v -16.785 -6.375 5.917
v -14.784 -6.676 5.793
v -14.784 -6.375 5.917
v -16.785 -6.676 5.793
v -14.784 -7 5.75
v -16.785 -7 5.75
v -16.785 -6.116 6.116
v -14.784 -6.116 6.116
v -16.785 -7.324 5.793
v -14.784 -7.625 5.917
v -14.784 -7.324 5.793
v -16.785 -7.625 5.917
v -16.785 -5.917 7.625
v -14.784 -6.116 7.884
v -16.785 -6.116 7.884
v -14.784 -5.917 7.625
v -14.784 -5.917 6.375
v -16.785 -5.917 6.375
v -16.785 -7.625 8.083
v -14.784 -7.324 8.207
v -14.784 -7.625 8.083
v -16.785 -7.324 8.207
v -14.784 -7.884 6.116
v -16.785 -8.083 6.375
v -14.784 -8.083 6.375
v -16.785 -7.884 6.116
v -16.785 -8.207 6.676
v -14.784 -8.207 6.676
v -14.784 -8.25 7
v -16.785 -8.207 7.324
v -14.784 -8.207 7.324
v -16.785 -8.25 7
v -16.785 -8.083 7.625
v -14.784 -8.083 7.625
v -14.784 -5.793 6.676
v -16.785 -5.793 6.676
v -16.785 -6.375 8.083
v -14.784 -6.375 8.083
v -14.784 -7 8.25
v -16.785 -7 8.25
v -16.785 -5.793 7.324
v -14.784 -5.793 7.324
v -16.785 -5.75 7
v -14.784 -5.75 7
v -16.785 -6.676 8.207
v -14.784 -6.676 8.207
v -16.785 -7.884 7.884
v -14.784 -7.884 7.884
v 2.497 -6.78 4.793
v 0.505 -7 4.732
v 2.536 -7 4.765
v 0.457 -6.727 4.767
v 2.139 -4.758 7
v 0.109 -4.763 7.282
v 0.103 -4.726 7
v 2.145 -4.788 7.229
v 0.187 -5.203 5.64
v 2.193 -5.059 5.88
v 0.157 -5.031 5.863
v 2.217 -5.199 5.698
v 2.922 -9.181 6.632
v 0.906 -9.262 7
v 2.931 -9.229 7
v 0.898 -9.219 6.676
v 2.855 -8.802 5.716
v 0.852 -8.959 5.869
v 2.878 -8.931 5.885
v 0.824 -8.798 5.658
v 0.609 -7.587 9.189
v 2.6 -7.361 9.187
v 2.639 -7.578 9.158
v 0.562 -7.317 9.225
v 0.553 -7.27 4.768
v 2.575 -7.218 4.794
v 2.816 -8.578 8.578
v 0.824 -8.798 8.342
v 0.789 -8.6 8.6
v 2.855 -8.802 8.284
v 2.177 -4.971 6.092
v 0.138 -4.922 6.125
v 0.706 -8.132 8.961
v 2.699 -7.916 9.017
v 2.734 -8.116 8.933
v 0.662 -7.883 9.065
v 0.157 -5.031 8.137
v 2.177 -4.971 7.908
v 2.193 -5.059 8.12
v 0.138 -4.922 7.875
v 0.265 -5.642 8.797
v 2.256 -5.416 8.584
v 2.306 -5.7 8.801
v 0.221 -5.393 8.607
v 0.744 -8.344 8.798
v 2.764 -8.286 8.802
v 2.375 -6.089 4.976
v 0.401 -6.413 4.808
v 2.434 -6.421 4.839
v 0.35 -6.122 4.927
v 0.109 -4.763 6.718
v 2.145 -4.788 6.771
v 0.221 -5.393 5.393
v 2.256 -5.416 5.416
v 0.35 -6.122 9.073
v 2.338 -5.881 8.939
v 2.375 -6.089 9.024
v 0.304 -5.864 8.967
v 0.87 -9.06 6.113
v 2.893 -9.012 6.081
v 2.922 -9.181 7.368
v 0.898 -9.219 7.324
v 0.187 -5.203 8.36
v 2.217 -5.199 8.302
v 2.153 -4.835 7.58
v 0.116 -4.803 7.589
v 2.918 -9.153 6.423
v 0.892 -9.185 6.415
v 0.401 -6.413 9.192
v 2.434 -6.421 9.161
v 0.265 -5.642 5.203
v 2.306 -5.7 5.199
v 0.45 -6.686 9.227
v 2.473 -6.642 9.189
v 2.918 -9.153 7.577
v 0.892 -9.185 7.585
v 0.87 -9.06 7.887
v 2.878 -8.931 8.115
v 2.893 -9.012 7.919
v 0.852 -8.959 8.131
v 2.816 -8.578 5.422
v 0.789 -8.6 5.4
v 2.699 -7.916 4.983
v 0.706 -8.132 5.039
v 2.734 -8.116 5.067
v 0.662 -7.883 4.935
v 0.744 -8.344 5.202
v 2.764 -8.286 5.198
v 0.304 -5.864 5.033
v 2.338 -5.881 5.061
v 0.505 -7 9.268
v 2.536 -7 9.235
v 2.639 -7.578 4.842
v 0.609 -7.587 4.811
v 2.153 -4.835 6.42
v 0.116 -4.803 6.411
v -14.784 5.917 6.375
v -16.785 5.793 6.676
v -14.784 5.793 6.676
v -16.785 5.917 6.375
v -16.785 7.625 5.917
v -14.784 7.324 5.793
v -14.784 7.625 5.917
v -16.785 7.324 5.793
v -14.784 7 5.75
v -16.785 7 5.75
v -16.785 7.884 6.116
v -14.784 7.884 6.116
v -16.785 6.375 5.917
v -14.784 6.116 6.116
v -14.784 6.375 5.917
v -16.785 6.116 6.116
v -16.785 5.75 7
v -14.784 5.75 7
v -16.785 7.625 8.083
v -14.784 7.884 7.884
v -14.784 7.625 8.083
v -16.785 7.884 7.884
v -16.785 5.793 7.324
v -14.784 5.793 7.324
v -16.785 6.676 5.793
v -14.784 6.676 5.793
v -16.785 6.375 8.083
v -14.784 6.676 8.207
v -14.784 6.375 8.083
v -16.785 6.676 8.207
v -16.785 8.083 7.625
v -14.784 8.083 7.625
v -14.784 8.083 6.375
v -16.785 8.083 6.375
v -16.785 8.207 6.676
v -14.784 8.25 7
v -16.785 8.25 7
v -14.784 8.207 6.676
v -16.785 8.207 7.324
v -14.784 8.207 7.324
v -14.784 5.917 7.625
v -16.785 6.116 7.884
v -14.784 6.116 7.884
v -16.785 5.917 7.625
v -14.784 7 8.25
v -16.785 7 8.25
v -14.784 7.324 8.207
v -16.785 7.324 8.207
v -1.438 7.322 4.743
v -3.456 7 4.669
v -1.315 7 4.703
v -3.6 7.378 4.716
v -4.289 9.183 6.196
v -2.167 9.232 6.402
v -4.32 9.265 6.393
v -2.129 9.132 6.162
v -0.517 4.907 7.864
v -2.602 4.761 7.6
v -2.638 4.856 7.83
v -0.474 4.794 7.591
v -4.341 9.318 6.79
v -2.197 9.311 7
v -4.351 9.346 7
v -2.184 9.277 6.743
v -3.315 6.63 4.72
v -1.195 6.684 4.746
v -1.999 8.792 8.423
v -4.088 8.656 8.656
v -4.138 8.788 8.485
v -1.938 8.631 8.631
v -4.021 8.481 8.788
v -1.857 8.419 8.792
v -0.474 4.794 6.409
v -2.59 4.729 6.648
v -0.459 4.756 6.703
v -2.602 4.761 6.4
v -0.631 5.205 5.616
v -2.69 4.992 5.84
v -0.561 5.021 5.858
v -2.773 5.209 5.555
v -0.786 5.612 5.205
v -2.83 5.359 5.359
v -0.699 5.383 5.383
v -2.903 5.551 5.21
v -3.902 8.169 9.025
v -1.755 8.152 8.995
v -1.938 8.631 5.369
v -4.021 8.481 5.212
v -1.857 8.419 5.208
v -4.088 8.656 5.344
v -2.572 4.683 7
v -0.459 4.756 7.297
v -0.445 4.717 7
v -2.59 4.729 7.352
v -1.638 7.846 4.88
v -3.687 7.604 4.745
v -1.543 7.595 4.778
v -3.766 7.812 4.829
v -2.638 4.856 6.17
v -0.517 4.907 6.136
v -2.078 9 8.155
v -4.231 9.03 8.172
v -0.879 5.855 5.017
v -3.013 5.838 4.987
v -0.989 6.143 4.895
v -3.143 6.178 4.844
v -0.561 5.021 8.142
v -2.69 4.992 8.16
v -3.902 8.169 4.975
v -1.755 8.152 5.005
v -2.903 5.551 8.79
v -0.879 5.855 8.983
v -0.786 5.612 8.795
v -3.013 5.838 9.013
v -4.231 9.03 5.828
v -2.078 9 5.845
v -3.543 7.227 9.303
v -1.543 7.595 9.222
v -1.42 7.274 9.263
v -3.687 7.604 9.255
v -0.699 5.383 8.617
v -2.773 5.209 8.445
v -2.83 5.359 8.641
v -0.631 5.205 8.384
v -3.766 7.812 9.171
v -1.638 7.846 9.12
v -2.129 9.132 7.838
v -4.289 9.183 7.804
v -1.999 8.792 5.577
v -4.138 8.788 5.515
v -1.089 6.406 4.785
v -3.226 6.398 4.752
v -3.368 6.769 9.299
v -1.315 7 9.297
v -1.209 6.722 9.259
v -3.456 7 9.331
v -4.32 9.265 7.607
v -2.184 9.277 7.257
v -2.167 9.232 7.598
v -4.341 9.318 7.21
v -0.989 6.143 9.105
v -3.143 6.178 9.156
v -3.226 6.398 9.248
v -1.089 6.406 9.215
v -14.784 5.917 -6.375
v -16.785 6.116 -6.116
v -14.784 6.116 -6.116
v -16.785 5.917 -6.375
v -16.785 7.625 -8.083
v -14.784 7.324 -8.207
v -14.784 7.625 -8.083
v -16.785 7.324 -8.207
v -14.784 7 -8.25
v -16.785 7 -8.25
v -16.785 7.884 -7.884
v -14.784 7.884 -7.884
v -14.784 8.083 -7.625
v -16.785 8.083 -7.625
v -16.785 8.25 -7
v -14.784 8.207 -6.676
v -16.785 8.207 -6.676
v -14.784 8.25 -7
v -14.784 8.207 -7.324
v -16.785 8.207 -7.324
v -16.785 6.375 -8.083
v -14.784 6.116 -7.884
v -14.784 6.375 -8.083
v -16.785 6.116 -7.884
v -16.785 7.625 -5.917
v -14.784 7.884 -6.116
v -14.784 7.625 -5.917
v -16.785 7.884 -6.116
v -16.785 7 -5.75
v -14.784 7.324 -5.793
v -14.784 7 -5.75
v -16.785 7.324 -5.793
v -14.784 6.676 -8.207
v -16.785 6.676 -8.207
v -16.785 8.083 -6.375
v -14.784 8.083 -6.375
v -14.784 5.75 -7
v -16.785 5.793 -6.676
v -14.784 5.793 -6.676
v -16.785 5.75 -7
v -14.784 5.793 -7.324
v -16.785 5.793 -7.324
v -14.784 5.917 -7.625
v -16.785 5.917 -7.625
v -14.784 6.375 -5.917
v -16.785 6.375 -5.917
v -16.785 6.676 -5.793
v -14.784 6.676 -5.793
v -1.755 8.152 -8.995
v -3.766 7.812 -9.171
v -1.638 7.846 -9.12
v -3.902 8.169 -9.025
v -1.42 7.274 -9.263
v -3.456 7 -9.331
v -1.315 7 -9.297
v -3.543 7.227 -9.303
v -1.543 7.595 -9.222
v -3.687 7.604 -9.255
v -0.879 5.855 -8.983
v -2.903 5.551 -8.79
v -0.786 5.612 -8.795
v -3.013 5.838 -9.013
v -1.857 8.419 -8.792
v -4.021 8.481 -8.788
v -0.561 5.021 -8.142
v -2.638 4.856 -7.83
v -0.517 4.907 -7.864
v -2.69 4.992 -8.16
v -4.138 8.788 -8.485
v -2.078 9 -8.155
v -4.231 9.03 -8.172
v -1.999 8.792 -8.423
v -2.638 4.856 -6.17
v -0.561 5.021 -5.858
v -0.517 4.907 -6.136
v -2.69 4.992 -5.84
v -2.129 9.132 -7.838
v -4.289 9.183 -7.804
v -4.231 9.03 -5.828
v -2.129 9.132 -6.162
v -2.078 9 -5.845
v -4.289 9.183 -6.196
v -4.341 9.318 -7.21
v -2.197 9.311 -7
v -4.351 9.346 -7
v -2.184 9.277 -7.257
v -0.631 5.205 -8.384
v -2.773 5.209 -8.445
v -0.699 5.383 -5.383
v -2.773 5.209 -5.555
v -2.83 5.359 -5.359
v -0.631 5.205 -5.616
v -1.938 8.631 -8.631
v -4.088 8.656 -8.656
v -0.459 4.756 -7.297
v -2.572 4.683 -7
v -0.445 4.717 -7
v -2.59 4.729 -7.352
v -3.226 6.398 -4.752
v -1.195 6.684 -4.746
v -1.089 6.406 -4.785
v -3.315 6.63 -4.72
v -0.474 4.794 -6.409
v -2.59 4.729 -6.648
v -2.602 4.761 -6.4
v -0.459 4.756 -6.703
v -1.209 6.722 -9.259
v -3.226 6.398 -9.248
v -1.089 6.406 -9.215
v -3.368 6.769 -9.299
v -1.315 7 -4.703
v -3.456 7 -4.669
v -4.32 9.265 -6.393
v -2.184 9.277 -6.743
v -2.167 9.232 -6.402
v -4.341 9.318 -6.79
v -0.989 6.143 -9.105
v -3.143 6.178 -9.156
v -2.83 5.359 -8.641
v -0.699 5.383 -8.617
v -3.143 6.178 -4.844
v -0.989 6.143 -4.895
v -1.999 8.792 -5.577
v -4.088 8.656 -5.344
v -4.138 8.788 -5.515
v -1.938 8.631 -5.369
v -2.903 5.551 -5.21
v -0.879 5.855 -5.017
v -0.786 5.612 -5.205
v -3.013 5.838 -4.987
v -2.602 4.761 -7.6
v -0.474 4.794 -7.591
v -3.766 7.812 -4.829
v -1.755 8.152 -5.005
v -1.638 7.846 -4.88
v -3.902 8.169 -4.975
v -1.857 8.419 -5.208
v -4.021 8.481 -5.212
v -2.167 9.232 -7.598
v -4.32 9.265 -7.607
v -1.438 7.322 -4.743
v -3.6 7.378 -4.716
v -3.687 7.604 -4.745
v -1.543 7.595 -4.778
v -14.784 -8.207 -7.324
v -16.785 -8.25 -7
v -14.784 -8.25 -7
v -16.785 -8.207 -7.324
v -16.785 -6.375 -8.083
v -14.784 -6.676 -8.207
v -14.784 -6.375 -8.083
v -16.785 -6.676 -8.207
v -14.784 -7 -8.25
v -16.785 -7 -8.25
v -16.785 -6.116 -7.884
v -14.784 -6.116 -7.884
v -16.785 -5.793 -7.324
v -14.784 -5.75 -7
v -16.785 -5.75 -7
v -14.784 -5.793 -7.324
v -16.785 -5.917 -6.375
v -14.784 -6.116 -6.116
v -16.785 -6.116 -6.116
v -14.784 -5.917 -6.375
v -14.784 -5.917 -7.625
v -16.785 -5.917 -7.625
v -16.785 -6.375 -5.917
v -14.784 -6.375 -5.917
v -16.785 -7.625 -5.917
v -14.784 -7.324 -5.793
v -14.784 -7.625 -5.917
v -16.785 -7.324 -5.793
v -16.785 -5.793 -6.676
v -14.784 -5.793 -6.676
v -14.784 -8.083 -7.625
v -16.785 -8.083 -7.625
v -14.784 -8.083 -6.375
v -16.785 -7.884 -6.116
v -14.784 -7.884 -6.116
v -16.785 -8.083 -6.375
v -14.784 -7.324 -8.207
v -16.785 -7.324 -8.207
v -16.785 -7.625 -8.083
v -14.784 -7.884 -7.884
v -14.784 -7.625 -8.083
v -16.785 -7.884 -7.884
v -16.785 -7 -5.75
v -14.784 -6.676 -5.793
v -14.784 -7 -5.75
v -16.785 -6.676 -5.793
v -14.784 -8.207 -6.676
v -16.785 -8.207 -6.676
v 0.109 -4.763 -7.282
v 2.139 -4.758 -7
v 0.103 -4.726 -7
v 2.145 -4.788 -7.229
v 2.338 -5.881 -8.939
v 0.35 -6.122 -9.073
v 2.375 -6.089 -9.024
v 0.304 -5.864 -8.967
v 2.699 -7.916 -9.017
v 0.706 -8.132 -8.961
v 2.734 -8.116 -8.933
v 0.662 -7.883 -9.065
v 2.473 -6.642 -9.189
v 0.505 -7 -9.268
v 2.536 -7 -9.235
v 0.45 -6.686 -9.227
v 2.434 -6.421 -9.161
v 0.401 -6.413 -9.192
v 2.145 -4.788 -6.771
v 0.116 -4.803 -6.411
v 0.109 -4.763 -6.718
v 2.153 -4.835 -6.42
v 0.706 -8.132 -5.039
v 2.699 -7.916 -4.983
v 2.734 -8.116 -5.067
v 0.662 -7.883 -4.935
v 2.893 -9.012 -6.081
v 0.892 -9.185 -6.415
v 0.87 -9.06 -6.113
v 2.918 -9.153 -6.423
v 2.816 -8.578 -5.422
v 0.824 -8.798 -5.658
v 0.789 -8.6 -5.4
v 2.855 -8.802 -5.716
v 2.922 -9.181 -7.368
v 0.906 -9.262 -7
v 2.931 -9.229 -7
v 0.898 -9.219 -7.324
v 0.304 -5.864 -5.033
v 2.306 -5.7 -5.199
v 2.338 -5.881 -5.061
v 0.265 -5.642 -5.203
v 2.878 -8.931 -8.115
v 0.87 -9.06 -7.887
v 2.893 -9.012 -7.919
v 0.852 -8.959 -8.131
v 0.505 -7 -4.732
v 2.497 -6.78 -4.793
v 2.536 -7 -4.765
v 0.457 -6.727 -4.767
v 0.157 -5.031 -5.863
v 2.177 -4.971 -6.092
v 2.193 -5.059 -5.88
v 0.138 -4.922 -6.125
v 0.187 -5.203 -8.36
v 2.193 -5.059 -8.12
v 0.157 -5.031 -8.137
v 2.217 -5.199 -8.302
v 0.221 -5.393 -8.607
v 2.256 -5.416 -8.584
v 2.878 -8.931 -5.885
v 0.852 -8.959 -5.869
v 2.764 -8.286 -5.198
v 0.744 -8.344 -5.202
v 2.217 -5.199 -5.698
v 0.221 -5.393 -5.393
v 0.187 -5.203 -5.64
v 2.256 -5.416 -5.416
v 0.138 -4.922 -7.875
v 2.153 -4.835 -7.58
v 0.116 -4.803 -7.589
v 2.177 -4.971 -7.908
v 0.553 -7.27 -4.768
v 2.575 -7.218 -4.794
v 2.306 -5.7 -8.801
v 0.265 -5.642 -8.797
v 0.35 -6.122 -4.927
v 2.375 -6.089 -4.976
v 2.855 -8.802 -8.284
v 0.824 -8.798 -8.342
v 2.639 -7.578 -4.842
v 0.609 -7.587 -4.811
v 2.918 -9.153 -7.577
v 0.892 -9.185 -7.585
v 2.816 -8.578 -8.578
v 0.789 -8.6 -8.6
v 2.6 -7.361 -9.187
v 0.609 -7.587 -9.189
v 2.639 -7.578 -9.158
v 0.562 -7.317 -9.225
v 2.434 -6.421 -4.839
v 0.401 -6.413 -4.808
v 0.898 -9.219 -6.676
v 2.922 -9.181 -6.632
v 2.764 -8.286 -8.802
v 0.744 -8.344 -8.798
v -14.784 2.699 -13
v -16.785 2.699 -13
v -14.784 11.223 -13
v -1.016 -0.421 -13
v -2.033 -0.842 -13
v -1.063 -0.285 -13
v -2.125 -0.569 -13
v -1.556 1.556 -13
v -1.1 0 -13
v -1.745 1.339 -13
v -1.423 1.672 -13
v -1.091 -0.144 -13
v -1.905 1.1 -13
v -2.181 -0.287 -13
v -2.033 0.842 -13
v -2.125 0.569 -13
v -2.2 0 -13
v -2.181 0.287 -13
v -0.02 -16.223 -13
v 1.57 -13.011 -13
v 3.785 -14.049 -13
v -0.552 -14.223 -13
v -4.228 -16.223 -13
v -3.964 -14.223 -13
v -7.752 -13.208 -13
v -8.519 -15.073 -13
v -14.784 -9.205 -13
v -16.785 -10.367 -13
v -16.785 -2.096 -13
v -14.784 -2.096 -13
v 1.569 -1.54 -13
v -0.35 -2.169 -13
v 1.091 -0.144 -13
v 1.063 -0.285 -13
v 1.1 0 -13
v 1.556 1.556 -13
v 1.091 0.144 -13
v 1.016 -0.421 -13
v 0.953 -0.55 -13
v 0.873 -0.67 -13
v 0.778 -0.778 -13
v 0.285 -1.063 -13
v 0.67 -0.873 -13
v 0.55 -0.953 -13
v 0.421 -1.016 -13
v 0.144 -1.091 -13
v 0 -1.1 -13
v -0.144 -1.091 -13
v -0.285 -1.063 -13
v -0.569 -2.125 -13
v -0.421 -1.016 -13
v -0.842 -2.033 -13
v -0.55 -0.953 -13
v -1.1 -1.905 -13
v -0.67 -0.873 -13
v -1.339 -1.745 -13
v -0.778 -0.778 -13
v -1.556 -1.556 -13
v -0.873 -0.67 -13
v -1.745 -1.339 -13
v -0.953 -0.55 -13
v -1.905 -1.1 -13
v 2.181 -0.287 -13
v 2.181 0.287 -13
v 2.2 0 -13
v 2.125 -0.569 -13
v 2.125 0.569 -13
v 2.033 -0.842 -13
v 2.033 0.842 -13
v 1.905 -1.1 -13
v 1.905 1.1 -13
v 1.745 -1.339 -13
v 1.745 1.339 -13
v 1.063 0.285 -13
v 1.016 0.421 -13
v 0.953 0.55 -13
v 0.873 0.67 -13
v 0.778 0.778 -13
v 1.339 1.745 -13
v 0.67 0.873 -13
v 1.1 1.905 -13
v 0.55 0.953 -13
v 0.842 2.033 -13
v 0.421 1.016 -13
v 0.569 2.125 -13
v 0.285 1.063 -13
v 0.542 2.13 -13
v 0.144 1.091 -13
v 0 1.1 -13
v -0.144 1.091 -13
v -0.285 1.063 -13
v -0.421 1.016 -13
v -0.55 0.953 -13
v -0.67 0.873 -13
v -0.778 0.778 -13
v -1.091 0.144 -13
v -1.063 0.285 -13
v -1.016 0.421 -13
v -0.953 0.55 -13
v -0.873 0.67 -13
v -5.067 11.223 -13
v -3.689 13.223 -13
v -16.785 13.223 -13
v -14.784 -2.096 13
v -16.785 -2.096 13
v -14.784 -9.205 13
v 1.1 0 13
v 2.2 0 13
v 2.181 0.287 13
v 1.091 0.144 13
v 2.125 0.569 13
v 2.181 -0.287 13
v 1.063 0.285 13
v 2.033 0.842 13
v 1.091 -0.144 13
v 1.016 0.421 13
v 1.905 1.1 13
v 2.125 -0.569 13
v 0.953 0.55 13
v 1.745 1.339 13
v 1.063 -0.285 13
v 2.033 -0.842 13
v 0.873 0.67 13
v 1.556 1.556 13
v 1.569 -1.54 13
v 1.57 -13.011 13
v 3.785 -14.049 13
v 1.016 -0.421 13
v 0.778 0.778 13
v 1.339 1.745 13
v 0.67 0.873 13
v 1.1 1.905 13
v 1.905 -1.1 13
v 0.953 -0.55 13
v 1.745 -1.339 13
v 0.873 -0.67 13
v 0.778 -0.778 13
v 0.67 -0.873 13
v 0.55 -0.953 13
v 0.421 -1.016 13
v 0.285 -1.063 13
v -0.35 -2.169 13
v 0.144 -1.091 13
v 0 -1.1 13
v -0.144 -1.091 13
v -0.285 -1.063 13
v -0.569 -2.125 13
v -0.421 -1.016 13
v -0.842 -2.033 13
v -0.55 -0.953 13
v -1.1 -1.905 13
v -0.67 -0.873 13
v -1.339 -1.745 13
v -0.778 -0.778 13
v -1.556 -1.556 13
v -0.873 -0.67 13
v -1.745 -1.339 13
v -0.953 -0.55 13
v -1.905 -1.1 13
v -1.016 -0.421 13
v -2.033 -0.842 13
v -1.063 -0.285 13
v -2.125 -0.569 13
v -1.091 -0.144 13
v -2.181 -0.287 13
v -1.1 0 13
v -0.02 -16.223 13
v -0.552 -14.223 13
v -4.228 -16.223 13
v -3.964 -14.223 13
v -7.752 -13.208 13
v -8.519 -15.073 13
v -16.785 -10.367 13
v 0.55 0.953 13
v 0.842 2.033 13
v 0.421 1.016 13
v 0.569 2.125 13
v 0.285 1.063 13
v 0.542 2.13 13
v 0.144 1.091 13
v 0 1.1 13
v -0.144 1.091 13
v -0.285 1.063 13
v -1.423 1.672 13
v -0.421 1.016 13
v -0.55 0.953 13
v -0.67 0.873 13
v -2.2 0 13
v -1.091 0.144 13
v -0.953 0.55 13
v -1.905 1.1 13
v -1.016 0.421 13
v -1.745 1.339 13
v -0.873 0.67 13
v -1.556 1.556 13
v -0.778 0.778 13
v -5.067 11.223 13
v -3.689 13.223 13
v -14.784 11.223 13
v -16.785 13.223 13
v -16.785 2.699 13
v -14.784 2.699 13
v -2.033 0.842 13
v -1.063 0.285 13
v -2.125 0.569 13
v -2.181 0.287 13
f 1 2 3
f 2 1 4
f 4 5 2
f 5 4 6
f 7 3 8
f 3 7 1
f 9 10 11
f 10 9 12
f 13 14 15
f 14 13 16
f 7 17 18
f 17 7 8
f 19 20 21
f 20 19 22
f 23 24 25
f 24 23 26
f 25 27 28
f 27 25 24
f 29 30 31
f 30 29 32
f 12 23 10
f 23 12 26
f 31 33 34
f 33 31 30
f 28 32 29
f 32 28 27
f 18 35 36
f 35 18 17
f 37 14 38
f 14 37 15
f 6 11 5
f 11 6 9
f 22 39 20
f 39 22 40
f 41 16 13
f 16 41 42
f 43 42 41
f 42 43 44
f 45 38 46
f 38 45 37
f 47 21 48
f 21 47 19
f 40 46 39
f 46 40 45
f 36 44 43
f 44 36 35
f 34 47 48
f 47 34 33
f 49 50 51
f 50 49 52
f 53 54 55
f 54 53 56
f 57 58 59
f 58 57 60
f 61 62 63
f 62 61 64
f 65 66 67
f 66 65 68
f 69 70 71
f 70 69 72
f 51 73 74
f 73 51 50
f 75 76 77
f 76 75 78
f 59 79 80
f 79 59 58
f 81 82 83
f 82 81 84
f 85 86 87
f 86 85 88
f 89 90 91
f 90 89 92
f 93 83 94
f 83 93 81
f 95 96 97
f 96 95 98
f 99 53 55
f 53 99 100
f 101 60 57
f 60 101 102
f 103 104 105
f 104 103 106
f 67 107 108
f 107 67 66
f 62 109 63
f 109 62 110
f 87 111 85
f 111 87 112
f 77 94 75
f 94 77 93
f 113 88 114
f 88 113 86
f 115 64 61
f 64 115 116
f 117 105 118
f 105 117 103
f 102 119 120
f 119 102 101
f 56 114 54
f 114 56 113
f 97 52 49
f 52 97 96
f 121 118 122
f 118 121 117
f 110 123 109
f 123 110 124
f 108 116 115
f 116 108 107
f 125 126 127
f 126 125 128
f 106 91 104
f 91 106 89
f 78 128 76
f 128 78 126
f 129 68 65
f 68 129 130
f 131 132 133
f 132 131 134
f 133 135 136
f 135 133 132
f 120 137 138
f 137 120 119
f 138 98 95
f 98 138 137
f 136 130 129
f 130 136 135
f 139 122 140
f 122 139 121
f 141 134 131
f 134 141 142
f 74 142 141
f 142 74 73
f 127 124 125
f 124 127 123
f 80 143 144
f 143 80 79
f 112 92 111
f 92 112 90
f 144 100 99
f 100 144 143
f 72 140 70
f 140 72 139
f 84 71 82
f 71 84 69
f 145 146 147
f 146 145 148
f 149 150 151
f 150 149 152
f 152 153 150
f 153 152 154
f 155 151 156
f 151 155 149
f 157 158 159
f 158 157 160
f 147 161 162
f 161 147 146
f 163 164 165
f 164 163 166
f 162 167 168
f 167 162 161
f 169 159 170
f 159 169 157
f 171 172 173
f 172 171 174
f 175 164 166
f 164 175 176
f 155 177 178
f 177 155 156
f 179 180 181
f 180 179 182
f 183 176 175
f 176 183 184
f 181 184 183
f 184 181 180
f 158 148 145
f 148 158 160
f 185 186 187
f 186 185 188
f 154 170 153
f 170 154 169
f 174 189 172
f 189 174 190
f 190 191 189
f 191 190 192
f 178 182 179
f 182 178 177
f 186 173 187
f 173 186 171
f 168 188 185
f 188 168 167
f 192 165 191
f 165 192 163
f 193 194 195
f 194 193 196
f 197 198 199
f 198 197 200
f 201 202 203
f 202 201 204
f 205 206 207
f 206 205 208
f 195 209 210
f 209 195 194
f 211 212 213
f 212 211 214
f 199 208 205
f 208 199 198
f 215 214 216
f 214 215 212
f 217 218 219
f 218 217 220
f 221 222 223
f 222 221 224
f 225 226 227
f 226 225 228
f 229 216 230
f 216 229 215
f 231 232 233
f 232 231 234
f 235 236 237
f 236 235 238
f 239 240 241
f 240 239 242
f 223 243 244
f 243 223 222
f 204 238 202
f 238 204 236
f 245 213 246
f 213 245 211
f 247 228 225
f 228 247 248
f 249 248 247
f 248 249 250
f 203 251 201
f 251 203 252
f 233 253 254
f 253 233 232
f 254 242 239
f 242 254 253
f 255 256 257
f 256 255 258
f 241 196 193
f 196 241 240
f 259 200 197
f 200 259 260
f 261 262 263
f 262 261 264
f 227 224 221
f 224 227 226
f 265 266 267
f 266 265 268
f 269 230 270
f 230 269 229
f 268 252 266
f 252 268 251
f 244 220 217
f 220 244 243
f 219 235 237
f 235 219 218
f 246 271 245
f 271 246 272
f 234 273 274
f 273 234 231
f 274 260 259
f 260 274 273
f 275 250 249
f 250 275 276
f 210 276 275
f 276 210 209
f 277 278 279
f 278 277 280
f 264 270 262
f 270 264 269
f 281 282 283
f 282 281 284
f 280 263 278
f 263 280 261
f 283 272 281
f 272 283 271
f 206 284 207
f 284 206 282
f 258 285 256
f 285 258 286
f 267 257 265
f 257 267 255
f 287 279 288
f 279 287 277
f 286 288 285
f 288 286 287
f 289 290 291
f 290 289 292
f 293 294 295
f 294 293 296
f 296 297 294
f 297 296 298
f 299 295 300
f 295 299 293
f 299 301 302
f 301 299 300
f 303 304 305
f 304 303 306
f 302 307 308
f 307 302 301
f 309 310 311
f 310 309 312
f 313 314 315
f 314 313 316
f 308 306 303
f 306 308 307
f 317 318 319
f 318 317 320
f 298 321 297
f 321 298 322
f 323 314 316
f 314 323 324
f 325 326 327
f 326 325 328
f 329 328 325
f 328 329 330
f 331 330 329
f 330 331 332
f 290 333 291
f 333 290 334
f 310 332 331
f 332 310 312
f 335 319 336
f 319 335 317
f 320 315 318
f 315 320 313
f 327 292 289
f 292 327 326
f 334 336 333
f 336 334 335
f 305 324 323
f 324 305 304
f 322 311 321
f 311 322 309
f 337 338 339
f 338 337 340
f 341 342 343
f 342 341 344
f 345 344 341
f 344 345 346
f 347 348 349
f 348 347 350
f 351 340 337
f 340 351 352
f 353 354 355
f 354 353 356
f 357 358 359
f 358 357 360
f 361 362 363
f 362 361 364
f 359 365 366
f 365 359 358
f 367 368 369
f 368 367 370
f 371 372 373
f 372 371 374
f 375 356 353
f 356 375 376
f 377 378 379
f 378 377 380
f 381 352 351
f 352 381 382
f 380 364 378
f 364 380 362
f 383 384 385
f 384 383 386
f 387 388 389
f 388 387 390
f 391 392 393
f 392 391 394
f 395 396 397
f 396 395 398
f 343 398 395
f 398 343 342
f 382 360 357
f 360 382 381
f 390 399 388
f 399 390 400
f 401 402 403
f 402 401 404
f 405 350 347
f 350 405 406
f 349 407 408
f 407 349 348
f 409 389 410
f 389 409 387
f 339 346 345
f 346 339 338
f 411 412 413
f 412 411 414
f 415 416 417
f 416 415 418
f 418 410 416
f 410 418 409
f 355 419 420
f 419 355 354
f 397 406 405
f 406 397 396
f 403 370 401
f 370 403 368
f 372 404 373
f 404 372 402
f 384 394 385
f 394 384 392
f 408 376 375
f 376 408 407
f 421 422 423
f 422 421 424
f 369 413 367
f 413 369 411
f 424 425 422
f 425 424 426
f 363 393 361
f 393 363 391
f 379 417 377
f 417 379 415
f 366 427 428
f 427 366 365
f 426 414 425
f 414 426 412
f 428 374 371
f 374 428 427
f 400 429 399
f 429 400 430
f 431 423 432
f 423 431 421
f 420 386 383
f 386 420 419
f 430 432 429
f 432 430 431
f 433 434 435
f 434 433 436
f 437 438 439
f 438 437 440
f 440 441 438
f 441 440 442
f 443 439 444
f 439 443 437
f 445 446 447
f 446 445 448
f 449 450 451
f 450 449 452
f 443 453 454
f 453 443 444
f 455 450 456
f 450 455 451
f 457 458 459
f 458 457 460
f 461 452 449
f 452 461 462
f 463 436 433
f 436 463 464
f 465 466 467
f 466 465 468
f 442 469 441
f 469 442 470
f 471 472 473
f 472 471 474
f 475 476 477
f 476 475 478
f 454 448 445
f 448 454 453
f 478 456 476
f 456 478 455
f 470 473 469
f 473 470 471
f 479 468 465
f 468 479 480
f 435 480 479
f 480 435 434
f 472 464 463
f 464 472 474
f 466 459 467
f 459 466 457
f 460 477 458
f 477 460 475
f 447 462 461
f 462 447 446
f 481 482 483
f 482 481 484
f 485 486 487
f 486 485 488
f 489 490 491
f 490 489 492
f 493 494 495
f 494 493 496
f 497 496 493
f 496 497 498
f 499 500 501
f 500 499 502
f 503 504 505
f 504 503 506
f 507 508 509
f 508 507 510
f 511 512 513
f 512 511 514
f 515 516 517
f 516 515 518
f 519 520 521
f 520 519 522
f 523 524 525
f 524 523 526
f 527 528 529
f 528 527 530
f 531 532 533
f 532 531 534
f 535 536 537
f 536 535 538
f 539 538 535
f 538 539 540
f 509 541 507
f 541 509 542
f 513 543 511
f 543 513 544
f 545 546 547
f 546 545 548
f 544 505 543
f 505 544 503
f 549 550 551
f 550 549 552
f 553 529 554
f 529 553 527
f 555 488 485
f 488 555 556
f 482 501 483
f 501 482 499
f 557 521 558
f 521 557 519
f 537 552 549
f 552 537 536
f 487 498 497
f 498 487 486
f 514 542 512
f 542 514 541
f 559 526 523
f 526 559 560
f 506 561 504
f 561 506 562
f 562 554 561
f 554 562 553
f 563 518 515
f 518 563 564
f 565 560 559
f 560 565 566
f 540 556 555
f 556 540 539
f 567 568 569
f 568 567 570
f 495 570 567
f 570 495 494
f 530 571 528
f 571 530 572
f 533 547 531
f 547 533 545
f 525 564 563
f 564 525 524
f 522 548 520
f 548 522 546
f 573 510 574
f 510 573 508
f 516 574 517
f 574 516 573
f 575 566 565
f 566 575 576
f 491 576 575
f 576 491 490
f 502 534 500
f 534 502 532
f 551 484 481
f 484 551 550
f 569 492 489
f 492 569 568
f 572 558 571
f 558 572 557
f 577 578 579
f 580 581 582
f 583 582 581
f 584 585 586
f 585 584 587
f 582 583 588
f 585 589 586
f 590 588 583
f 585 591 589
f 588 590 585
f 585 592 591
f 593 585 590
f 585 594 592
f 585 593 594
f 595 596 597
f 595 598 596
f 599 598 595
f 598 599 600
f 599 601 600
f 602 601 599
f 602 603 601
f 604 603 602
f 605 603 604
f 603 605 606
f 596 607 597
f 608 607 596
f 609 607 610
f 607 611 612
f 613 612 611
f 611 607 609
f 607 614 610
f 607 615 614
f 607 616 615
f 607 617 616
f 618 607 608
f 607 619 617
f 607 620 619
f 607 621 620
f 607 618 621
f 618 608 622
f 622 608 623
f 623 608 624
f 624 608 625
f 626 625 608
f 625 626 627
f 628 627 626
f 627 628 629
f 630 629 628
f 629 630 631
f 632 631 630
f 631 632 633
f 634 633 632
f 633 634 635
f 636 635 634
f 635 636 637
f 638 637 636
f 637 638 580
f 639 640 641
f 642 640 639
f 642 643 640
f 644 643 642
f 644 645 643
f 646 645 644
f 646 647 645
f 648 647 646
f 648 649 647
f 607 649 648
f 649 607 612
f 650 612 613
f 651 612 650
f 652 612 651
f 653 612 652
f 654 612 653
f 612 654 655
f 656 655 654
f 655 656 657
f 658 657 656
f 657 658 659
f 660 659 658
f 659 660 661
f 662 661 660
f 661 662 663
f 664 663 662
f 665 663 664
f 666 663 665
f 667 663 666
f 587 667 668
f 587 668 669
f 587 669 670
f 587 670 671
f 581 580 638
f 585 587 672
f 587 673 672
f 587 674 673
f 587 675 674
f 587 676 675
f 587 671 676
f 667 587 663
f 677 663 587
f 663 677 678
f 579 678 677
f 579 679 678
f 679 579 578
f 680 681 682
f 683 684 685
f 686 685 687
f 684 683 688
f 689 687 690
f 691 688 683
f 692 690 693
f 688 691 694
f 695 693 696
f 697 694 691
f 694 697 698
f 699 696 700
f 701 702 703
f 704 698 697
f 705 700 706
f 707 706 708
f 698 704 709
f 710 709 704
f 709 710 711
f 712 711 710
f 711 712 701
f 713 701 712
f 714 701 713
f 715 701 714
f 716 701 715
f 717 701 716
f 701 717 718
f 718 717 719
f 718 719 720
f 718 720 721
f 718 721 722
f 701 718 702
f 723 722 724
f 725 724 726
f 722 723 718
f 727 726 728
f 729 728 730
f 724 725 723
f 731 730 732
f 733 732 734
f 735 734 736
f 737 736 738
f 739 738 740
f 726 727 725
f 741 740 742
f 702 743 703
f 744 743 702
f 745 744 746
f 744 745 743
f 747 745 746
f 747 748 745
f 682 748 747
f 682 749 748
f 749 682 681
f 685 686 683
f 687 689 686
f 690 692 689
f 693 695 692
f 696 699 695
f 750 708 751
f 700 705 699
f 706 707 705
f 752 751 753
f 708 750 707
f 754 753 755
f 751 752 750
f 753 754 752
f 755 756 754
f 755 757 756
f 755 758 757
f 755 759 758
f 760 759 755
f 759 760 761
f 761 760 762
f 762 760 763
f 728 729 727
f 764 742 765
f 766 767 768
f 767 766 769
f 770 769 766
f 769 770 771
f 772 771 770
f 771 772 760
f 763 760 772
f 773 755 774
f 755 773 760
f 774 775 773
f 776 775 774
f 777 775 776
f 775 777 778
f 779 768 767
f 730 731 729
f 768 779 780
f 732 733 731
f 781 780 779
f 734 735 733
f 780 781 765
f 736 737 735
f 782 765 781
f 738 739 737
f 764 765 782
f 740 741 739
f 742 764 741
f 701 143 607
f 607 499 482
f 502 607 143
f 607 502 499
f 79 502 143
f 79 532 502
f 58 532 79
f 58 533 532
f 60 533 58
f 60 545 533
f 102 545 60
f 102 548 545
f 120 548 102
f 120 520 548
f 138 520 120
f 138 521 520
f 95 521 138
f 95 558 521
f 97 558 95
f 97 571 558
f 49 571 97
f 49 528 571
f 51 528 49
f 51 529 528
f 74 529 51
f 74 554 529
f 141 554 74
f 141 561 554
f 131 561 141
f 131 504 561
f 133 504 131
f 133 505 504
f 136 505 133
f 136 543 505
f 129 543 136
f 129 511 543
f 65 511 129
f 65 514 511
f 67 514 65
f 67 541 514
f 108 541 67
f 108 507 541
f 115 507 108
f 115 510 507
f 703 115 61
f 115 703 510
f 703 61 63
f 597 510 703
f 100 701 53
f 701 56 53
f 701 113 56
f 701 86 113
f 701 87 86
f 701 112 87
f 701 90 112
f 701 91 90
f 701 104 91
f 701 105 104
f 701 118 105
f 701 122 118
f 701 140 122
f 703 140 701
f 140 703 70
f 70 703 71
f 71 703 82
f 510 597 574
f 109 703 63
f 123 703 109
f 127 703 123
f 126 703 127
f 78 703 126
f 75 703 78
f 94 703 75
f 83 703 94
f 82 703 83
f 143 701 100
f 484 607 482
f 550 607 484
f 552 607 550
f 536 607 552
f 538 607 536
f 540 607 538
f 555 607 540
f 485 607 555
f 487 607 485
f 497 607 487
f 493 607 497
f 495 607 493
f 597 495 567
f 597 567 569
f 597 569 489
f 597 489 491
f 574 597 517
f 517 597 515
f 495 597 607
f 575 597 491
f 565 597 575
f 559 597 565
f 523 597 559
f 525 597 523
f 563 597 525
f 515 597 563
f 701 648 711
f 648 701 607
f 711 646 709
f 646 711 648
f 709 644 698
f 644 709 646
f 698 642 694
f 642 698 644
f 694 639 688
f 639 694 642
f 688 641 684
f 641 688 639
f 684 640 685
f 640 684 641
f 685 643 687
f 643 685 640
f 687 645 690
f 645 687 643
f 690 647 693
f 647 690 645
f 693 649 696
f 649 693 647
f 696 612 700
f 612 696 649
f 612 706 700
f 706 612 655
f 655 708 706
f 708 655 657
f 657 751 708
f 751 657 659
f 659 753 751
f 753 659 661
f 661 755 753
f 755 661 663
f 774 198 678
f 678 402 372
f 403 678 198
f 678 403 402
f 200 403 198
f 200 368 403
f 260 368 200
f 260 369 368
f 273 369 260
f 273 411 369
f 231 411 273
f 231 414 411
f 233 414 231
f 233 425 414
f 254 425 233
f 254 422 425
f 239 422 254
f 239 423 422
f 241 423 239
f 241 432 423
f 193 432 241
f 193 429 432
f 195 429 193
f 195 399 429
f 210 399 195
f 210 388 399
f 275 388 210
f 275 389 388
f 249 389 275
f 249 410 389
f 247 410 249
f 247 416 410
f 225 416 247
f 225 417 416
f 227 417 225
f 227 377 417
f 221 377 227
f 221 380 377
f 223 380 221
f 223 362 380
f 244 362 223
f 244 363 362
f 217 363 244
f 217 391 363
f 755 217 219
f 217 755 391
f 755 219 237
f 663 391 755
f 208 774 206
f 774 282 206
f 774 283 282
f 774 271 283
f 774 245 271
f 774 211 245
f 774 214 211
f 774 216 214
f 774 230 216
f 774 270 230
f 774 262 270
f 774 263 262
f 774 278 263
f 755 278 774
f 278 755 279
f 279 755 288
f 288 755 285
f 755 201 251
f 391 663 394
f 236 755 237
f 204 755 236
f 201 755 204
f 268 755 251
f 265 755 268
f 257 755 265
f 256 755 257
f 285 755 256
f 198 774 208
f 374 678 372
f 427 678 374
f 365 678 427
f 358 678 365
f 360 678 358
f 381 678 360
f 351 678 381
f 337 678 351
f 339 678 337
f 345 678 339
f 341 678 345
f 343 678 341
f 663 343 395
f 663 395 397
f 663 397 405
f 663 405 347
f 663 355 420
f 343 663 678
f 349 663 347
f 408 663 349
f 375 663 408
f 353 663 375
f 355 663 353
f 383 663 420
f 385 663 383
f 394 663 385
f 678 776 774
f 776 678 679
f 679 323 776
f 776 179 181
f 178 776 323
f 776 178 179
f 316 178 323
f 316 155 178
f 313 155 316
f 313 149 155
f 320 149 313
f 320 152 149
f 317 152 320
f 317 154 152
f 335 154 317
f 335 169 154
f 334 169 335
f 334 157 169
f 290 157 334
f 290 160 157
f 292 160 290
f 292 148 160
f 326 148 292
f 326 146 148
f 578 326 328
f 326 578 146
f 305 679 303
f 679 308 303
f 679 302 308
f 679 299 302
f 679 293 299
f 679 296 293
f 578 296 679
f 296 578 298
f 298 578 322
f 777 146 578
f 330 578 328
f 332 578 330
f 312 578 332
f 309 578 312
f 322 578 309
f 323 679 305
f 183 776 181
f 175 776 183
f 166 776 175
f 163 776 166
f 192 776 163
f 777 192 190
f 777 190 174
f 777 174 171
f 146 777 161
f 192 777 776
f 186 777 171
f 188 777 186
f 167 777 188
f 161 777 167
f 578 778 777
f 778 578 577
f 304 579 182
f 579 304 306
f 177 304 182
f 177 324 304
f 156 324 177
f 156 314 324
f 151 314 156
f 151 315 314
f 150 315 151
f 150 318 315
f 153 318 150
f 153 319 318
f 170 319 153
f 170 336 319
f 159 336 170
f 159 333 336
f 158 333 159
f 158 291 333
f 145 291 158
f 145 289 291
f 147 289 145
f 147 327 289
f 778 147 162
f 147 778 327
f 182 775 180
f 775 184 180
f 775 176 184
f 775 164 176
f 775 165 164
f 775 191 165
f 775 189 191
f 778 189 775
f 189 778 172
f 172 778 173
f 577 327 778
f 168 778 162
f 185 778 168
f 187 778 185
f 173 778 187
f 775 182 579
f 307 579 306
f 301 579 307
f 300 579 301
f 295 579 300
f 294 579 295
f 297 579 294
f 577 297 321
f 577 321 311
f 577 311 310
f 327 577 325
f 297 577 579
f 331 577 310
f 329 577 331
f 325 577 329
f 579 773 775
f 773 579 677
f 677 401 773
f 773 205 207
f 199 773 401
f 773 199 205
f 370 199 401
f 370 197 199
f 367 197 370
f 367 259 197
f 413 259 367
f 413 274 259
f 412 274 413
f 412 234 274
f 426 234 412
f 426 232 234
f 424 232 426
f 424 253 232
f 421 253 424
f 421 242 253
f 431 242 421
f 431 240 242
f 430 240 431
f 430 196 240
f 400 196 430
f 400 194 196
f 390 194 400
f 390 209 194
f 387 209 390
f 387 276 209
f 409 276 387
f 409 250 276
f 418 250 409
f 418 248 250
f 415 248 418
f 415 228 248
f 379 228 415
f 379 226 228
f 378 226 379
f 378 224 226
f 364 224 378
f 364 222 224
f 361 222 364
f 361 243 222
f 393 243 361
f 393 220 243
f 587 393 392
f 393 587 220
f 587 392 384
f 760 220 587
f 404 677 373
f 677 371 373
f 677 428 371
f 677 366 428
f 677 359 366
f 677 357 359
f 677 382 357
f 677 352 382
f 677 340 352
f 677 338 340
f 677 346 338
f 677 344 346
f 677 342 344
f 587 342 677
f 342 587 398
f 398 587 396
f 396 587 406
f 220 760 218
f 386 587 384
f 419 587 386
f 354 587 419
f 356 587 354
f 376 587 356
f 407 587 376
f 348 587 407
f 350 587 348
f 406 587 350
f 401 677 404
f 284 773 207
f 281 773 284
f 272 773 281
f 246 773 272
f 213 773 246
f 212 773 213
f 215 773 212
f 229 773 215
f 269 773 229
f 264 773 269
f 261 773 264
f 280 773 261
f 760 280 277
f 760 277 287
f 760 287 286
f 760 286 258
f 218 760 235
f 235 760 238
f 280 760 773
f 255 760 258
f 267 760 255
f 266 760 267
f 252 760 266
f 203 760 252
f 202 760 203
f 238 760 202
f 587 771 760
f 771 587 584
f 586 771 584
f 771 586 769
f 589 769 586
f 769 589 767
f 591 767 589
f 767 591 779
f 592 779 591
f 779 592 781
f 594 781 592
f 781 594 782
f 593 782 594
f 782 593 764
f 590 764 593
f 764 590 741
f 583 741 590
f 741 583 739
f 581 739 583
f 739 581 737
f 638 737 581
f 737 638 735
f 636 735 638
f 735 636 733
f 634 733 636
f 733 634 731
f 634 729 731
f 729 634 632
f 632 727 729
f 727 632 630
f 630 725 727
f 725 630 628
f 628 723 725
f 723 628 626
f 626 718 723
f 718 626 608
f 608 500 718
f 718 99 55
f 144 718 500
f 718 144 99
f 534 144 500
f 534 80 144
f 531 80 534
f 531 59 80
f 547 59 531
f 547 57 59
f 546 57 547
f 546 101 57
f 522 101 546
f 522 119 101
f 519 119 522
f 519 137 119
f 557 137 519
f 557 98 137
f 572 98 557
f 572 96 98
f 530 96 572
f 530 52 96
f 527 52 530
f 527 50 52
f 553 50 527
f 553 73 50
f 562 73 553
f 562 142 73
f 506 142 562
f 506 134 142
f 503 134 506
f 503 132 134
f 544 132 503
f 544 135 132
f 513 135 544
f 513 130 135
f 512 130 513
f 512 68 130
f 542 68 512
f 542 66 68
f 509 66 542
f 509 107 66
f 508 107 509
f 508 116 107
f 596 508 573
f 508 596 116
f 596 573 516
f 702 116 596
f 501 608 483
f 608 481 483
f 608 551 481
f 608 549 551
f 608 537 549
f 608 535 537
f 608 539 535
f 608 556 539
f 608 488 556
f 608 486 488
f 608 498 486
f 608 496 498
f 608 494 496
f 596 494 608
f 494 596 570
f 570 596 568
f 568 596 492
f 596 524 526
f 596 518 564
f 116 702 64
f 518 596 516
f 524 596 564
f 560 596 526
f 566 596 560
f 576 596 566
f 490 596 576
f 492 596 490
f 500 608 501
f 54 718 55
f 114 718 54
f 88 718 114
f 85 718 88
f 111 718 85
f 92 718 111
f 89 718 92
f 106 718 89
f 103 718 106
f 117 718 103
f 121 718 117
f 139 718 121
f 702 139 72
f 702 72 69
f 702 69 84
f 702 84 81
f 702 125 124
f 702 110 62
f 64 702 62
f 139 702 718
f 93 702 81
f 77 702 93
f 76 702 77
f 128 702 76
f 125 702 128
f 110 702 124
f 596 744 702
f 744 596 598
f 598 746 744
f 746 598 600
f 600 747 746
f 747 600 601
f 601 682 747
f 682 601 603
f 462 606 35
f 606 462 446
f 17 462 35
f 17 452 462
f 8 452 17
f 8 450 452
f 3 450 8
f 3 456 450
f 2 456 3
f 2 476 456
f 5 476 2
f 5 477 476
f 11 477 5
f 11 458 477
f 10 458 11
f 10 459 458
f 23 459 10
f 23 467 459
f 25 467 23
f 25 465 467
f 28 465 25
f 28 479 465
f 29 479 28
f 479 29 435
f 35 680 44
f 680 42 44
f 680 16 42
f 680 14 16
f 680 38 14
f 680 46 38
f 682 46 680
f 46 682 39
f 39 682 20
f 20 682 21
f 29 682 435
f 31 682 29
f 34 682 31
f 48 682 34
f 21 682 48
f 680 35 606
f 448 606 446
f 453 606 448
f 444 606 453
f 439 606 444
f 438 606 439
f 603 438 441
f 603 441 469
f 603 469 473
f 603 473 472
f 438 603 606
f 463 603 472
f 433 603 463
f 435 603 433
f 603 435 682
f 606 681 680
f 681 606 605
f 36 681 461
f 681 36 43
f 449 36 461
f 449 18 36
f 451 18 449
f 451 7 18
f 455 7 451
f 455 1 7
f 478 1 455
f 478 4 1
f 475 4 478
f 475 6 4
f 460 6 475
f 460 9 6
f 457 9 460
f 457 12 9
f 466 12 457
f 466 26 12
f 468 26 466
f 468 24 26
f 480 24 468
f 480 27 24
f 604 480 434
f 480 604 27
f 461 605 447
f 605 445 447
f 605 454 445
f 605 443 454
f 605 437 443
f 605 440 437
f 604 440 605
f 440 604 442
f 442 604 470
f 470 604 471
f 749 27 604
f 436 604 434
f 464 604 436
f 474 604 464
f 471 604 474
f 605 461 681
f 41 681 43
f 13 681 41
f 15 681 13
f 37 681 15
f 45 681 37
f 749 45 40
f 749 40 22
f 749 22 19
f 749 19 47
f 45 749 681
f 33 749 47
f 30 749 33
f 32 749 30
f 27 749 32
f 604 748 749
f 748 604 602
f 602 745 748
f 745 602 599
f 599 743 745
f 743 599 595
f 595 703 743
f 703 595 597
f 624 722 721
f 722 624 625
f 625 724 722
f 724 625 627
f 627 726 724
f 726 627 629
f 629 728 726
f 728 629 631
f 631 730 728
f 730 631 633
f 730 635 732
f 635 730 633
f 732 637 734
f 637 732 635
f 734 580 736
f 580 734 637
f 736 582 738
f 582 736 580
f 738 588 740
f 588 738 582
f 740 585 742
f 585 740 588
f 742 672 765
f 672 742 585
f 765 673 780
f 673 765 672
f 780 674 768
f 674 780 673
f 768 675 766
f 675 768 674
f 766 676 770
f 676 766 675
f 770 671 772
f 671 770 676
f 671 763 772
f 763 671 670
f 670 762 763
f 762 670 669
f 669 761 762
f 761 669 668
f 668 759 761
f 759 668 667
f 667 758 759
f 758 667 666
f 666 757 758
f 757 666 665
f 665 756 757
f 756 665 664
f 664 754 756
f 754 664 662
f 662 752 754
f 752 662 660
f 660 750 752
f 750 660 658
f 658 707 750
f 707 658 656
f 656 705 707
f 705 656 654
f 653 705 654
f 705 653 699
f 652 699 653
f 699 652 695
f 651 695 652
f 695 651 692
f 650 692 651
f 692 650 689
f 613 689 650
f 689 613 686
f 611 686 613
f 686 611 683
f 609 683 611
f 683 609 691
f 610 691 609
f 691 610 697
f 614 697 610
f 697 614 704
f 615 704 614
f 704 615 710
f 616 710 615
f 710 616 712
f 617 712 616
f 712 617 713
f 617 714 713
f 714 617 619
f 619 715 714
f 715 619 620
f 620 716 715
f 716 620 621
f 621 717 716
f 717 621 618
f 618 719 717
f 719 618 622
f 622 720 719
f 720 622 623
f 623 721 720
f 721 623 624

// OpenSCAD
// file: laser_box.scad
/*
 * laser_box.scad <https://github.com/bobm123/maker>
 *
 * Copyright (c) 2016 Robert Marchese.
 * Licensed under the MIT license.
 *
 * OpenSCAD modules to generate parts for a laser cut
 * box given the outside dimentsion, number of fingers
 * for the box joints and thickness of the material
 *
 */

KERF = .3;
SPACER = 2+KERF;


// Example of 50mm x 30mm x 1", made from 1/16" thick matertial
//laser_box(50, 30, 25.4*1, 11, 25.4*(1/16));
LENGTH = 25.4 * 8;
WIDTH = 25.4 * 7;
HEIGHT = 25.4 * 8;
laser_box(LENGTH, WIDTH, HEIGHT, 25, 4);


module laser_box(length, width, height, fingers, material)
{
    finger_width = height / fingers;
    translate([0, 0, 0])
        bottom(length, width, fingers, KERF, material);

    translate([length+SPACER, 0, 0]) 
        side1(width, height, fingers, KERF, material);
    translate([length+SPACER+width+SPACER, 0, 0])
        side2(length, height, fingers, KERF, material);

}


module box_joint(jlen, fcount, thick, kerf, show_a)
{
    flen = jlen / fcount;
    rotate([0, 0, 90])
    if (show_a) {
        side_a(jlen, flen, thick, kerf, (1+fcount)%2);
    }
    else {
        side_b(jlen, flen, thick, kerf, fcount%2);
    }
}


module side_a(jlen, flen, thick, kerf, even=1)
{
    os_initial = 0;
    intersection() {
        square([jlen+kerf, thick]);
        for (n = [0:1:(jlen)/(2*flen)-even]) {
            os = os_initial + n*2*flen;
            translate([os, 0]) 
                square([flen+kerf, thick]);
        }
    }
}


module side_b(jlen, flen, thick, kerf, odd=1)
{
    os_initial = flen;
    intersection() {
        square([jlen+kerf, thick]);
        for (n = [0:1:(jlen)/(2*flen)-odd]) {
            os = os_initial + n*2*flen;
            translate([os, 0]) 
                square([flen+kerf, thick]);
        }
    }
}


module bottom(length, width, fingers, kerf, material) {
    // flat bottom for now
    square([length+kerf, width+kerf]);
}


module side1(width, height, fingers, kerf, material) {
    translate([material, 0])
        square([width-(2*material-kerf), height+kerf]);
    translate([material, 0,])
        box_joint(height, fingers, material, kerf, true);
    translate([width+kerf, 0])
        box_joint(height, fingers, material, kerf, true);
}


module side2(length, height, fingers, kerf, material) {
    translate([material, 0])
        square([length-(2*material-kerf), height+kerf]);
    translate([material, 0,])
        box_joint(height, fingers, material, kerf, false);
    translate([length+kerf, 0])
        box_joint(height, fingers, material, kerf, false);
}
// file: LaserTilt.scad
/*!
 * LaserTile.scad <https://github.com/bobm123/maker>
 *
 * Copyright (c) 2016 Robert Marchese.
 * Licensed under the MIT license.
 *
 * OpenSCAD modules to generate a tilt mount for small
 * outrunner motors.
 *
 */
use <laser_box.scad>;

KERF = .3;
SPACER = 4+KERF;

thickness = 25.4*(1/16);
tilt_mount(27, 30, 26, 5, thickness);

module tilt_mount(length, width, height, fingers, material)
{
    //side plate
    difference() {
        translate([0, 0, 0]) {
            side1(length, height, fingers, KERF, material);
        }
    polygon([[0,height-4],
             [0,height+KERF],
             [length/2, height+KERF]]);
    polygon([[0,4],[0,0],[length-material, 0]]);
        translate([2+length/4, height/2, 0])
            circle(r=25.4*(1/32), center=true, $fn=48);
        translate([2+length/2, height-3, 0])
            circle(r=25.4*(1/64), center=true, $fn=48);  
    }
    
    // back plate
    translate([-(width+SPACER), height/fingers, 0])    
        side1(width, (height/fingers)*(fingers-2), fingers-2, KERF, material);

    // front plate
    translate([length+SPACER, 0, 0]) {
        difference() {
            side2(width, height, fingers, KERF, material);
            translate([width/2, 1.5, 0])
                square([6,3], center=true);
            translate([width/2, height/2, 0]) {
                circle(r=3.5, center=true, $fn=48);
                for (a=[45:90:360]) rotate([0, 0, a]) {
                    translate([7, 0])
                        circle(r=1.1, center=true, $fn=48);
                    translate([14, 0])
                        circle(r=1.25, center=true, $fn=48);
                }
            }
        }
    }
}

module side_plate(length, width, height, fingers, material)
{
    difference() {
        translate([0, 0, 0]) {
            side1(length, height, fingers, KERF, material);
        }
    polygon([[0,height-4],
             [0,height+KERF],
             [length/2, height+KERF]]);
    polygon([[0,4],[0,0],[length-material, 0]]);
        translate([2+length/4, height/2, 0])
            circle(r=25.4*(1/32), center=true, $fn=48);
        translate([2+length/2, height-3, 0])
            circle(r=25.4*(1/64), center=true, $fn=48);  
    }
}
// main file
use <LaserTilt.scad>;


length = 27;
width = 30;
height=26;

KERF = .3;
SPACER = 4+KERF;

thickness = 25.4*(1/16);


//color("tan") 
//    rotate([0,0,60]) translate([-2-length/4, -height/2])
//    side_plate(27, 30, 26, 5, thickness);
//color("yellow") 
//    rotate([0,0,0]) translate([-2-length/4, -height/2])
//    side_plate(27, 30, 26, 5, thickness);

difference() {
    linear_extrude(height=26, center=true) difference() {
        bracket_profile();
        circle(r=1.1, center=true, $fn=48);
    }
    #translate([-17,0,0]) rotate([0,90,0]) 
        for (t=[[-7,-7,0],[-7,7,0],[7,7,0],[7,-7,0]]) {
            translate(t) cylinder(h = 3, r1=2.5/2, r2=2.5/2, $fn=24);
            translate(t) translate([0,0,3]) cylinder(h = 25, r1=5/2, r2=4.2/2, $fn=24);
        }
}

module bracket_profile()
{
  circle(r=2.2, center=true, $fn=48);
  translate([-6.5,-1.5,0])   scale([25.4/90, -25.4/90, 1]) union()
  {
      polygon([[-36.441406,-52.168900],[-36.441406,-14.879900],[-29.353516,-14.879900],[-29.353516,-45.081100],[5.076172,-45.081100],[20.587891,-4.426800],[28.593750,40.786100],[21.076172,45.081100],[8.984375,45.081100],[-4.437500,41.485400],[-29.353516,27.299800],[-29.353516,2.112300],[-36.441406,2.112300],[-36.441406,31.418900],[-7.152344,48.094700],[8.050781,52.168900],[22.958984,52.168900],[36.441406,44.463900],[27.447266,-6.323200],[9.958984,-52.168900],[-36.441406,-52.168900]]);
  }
}
